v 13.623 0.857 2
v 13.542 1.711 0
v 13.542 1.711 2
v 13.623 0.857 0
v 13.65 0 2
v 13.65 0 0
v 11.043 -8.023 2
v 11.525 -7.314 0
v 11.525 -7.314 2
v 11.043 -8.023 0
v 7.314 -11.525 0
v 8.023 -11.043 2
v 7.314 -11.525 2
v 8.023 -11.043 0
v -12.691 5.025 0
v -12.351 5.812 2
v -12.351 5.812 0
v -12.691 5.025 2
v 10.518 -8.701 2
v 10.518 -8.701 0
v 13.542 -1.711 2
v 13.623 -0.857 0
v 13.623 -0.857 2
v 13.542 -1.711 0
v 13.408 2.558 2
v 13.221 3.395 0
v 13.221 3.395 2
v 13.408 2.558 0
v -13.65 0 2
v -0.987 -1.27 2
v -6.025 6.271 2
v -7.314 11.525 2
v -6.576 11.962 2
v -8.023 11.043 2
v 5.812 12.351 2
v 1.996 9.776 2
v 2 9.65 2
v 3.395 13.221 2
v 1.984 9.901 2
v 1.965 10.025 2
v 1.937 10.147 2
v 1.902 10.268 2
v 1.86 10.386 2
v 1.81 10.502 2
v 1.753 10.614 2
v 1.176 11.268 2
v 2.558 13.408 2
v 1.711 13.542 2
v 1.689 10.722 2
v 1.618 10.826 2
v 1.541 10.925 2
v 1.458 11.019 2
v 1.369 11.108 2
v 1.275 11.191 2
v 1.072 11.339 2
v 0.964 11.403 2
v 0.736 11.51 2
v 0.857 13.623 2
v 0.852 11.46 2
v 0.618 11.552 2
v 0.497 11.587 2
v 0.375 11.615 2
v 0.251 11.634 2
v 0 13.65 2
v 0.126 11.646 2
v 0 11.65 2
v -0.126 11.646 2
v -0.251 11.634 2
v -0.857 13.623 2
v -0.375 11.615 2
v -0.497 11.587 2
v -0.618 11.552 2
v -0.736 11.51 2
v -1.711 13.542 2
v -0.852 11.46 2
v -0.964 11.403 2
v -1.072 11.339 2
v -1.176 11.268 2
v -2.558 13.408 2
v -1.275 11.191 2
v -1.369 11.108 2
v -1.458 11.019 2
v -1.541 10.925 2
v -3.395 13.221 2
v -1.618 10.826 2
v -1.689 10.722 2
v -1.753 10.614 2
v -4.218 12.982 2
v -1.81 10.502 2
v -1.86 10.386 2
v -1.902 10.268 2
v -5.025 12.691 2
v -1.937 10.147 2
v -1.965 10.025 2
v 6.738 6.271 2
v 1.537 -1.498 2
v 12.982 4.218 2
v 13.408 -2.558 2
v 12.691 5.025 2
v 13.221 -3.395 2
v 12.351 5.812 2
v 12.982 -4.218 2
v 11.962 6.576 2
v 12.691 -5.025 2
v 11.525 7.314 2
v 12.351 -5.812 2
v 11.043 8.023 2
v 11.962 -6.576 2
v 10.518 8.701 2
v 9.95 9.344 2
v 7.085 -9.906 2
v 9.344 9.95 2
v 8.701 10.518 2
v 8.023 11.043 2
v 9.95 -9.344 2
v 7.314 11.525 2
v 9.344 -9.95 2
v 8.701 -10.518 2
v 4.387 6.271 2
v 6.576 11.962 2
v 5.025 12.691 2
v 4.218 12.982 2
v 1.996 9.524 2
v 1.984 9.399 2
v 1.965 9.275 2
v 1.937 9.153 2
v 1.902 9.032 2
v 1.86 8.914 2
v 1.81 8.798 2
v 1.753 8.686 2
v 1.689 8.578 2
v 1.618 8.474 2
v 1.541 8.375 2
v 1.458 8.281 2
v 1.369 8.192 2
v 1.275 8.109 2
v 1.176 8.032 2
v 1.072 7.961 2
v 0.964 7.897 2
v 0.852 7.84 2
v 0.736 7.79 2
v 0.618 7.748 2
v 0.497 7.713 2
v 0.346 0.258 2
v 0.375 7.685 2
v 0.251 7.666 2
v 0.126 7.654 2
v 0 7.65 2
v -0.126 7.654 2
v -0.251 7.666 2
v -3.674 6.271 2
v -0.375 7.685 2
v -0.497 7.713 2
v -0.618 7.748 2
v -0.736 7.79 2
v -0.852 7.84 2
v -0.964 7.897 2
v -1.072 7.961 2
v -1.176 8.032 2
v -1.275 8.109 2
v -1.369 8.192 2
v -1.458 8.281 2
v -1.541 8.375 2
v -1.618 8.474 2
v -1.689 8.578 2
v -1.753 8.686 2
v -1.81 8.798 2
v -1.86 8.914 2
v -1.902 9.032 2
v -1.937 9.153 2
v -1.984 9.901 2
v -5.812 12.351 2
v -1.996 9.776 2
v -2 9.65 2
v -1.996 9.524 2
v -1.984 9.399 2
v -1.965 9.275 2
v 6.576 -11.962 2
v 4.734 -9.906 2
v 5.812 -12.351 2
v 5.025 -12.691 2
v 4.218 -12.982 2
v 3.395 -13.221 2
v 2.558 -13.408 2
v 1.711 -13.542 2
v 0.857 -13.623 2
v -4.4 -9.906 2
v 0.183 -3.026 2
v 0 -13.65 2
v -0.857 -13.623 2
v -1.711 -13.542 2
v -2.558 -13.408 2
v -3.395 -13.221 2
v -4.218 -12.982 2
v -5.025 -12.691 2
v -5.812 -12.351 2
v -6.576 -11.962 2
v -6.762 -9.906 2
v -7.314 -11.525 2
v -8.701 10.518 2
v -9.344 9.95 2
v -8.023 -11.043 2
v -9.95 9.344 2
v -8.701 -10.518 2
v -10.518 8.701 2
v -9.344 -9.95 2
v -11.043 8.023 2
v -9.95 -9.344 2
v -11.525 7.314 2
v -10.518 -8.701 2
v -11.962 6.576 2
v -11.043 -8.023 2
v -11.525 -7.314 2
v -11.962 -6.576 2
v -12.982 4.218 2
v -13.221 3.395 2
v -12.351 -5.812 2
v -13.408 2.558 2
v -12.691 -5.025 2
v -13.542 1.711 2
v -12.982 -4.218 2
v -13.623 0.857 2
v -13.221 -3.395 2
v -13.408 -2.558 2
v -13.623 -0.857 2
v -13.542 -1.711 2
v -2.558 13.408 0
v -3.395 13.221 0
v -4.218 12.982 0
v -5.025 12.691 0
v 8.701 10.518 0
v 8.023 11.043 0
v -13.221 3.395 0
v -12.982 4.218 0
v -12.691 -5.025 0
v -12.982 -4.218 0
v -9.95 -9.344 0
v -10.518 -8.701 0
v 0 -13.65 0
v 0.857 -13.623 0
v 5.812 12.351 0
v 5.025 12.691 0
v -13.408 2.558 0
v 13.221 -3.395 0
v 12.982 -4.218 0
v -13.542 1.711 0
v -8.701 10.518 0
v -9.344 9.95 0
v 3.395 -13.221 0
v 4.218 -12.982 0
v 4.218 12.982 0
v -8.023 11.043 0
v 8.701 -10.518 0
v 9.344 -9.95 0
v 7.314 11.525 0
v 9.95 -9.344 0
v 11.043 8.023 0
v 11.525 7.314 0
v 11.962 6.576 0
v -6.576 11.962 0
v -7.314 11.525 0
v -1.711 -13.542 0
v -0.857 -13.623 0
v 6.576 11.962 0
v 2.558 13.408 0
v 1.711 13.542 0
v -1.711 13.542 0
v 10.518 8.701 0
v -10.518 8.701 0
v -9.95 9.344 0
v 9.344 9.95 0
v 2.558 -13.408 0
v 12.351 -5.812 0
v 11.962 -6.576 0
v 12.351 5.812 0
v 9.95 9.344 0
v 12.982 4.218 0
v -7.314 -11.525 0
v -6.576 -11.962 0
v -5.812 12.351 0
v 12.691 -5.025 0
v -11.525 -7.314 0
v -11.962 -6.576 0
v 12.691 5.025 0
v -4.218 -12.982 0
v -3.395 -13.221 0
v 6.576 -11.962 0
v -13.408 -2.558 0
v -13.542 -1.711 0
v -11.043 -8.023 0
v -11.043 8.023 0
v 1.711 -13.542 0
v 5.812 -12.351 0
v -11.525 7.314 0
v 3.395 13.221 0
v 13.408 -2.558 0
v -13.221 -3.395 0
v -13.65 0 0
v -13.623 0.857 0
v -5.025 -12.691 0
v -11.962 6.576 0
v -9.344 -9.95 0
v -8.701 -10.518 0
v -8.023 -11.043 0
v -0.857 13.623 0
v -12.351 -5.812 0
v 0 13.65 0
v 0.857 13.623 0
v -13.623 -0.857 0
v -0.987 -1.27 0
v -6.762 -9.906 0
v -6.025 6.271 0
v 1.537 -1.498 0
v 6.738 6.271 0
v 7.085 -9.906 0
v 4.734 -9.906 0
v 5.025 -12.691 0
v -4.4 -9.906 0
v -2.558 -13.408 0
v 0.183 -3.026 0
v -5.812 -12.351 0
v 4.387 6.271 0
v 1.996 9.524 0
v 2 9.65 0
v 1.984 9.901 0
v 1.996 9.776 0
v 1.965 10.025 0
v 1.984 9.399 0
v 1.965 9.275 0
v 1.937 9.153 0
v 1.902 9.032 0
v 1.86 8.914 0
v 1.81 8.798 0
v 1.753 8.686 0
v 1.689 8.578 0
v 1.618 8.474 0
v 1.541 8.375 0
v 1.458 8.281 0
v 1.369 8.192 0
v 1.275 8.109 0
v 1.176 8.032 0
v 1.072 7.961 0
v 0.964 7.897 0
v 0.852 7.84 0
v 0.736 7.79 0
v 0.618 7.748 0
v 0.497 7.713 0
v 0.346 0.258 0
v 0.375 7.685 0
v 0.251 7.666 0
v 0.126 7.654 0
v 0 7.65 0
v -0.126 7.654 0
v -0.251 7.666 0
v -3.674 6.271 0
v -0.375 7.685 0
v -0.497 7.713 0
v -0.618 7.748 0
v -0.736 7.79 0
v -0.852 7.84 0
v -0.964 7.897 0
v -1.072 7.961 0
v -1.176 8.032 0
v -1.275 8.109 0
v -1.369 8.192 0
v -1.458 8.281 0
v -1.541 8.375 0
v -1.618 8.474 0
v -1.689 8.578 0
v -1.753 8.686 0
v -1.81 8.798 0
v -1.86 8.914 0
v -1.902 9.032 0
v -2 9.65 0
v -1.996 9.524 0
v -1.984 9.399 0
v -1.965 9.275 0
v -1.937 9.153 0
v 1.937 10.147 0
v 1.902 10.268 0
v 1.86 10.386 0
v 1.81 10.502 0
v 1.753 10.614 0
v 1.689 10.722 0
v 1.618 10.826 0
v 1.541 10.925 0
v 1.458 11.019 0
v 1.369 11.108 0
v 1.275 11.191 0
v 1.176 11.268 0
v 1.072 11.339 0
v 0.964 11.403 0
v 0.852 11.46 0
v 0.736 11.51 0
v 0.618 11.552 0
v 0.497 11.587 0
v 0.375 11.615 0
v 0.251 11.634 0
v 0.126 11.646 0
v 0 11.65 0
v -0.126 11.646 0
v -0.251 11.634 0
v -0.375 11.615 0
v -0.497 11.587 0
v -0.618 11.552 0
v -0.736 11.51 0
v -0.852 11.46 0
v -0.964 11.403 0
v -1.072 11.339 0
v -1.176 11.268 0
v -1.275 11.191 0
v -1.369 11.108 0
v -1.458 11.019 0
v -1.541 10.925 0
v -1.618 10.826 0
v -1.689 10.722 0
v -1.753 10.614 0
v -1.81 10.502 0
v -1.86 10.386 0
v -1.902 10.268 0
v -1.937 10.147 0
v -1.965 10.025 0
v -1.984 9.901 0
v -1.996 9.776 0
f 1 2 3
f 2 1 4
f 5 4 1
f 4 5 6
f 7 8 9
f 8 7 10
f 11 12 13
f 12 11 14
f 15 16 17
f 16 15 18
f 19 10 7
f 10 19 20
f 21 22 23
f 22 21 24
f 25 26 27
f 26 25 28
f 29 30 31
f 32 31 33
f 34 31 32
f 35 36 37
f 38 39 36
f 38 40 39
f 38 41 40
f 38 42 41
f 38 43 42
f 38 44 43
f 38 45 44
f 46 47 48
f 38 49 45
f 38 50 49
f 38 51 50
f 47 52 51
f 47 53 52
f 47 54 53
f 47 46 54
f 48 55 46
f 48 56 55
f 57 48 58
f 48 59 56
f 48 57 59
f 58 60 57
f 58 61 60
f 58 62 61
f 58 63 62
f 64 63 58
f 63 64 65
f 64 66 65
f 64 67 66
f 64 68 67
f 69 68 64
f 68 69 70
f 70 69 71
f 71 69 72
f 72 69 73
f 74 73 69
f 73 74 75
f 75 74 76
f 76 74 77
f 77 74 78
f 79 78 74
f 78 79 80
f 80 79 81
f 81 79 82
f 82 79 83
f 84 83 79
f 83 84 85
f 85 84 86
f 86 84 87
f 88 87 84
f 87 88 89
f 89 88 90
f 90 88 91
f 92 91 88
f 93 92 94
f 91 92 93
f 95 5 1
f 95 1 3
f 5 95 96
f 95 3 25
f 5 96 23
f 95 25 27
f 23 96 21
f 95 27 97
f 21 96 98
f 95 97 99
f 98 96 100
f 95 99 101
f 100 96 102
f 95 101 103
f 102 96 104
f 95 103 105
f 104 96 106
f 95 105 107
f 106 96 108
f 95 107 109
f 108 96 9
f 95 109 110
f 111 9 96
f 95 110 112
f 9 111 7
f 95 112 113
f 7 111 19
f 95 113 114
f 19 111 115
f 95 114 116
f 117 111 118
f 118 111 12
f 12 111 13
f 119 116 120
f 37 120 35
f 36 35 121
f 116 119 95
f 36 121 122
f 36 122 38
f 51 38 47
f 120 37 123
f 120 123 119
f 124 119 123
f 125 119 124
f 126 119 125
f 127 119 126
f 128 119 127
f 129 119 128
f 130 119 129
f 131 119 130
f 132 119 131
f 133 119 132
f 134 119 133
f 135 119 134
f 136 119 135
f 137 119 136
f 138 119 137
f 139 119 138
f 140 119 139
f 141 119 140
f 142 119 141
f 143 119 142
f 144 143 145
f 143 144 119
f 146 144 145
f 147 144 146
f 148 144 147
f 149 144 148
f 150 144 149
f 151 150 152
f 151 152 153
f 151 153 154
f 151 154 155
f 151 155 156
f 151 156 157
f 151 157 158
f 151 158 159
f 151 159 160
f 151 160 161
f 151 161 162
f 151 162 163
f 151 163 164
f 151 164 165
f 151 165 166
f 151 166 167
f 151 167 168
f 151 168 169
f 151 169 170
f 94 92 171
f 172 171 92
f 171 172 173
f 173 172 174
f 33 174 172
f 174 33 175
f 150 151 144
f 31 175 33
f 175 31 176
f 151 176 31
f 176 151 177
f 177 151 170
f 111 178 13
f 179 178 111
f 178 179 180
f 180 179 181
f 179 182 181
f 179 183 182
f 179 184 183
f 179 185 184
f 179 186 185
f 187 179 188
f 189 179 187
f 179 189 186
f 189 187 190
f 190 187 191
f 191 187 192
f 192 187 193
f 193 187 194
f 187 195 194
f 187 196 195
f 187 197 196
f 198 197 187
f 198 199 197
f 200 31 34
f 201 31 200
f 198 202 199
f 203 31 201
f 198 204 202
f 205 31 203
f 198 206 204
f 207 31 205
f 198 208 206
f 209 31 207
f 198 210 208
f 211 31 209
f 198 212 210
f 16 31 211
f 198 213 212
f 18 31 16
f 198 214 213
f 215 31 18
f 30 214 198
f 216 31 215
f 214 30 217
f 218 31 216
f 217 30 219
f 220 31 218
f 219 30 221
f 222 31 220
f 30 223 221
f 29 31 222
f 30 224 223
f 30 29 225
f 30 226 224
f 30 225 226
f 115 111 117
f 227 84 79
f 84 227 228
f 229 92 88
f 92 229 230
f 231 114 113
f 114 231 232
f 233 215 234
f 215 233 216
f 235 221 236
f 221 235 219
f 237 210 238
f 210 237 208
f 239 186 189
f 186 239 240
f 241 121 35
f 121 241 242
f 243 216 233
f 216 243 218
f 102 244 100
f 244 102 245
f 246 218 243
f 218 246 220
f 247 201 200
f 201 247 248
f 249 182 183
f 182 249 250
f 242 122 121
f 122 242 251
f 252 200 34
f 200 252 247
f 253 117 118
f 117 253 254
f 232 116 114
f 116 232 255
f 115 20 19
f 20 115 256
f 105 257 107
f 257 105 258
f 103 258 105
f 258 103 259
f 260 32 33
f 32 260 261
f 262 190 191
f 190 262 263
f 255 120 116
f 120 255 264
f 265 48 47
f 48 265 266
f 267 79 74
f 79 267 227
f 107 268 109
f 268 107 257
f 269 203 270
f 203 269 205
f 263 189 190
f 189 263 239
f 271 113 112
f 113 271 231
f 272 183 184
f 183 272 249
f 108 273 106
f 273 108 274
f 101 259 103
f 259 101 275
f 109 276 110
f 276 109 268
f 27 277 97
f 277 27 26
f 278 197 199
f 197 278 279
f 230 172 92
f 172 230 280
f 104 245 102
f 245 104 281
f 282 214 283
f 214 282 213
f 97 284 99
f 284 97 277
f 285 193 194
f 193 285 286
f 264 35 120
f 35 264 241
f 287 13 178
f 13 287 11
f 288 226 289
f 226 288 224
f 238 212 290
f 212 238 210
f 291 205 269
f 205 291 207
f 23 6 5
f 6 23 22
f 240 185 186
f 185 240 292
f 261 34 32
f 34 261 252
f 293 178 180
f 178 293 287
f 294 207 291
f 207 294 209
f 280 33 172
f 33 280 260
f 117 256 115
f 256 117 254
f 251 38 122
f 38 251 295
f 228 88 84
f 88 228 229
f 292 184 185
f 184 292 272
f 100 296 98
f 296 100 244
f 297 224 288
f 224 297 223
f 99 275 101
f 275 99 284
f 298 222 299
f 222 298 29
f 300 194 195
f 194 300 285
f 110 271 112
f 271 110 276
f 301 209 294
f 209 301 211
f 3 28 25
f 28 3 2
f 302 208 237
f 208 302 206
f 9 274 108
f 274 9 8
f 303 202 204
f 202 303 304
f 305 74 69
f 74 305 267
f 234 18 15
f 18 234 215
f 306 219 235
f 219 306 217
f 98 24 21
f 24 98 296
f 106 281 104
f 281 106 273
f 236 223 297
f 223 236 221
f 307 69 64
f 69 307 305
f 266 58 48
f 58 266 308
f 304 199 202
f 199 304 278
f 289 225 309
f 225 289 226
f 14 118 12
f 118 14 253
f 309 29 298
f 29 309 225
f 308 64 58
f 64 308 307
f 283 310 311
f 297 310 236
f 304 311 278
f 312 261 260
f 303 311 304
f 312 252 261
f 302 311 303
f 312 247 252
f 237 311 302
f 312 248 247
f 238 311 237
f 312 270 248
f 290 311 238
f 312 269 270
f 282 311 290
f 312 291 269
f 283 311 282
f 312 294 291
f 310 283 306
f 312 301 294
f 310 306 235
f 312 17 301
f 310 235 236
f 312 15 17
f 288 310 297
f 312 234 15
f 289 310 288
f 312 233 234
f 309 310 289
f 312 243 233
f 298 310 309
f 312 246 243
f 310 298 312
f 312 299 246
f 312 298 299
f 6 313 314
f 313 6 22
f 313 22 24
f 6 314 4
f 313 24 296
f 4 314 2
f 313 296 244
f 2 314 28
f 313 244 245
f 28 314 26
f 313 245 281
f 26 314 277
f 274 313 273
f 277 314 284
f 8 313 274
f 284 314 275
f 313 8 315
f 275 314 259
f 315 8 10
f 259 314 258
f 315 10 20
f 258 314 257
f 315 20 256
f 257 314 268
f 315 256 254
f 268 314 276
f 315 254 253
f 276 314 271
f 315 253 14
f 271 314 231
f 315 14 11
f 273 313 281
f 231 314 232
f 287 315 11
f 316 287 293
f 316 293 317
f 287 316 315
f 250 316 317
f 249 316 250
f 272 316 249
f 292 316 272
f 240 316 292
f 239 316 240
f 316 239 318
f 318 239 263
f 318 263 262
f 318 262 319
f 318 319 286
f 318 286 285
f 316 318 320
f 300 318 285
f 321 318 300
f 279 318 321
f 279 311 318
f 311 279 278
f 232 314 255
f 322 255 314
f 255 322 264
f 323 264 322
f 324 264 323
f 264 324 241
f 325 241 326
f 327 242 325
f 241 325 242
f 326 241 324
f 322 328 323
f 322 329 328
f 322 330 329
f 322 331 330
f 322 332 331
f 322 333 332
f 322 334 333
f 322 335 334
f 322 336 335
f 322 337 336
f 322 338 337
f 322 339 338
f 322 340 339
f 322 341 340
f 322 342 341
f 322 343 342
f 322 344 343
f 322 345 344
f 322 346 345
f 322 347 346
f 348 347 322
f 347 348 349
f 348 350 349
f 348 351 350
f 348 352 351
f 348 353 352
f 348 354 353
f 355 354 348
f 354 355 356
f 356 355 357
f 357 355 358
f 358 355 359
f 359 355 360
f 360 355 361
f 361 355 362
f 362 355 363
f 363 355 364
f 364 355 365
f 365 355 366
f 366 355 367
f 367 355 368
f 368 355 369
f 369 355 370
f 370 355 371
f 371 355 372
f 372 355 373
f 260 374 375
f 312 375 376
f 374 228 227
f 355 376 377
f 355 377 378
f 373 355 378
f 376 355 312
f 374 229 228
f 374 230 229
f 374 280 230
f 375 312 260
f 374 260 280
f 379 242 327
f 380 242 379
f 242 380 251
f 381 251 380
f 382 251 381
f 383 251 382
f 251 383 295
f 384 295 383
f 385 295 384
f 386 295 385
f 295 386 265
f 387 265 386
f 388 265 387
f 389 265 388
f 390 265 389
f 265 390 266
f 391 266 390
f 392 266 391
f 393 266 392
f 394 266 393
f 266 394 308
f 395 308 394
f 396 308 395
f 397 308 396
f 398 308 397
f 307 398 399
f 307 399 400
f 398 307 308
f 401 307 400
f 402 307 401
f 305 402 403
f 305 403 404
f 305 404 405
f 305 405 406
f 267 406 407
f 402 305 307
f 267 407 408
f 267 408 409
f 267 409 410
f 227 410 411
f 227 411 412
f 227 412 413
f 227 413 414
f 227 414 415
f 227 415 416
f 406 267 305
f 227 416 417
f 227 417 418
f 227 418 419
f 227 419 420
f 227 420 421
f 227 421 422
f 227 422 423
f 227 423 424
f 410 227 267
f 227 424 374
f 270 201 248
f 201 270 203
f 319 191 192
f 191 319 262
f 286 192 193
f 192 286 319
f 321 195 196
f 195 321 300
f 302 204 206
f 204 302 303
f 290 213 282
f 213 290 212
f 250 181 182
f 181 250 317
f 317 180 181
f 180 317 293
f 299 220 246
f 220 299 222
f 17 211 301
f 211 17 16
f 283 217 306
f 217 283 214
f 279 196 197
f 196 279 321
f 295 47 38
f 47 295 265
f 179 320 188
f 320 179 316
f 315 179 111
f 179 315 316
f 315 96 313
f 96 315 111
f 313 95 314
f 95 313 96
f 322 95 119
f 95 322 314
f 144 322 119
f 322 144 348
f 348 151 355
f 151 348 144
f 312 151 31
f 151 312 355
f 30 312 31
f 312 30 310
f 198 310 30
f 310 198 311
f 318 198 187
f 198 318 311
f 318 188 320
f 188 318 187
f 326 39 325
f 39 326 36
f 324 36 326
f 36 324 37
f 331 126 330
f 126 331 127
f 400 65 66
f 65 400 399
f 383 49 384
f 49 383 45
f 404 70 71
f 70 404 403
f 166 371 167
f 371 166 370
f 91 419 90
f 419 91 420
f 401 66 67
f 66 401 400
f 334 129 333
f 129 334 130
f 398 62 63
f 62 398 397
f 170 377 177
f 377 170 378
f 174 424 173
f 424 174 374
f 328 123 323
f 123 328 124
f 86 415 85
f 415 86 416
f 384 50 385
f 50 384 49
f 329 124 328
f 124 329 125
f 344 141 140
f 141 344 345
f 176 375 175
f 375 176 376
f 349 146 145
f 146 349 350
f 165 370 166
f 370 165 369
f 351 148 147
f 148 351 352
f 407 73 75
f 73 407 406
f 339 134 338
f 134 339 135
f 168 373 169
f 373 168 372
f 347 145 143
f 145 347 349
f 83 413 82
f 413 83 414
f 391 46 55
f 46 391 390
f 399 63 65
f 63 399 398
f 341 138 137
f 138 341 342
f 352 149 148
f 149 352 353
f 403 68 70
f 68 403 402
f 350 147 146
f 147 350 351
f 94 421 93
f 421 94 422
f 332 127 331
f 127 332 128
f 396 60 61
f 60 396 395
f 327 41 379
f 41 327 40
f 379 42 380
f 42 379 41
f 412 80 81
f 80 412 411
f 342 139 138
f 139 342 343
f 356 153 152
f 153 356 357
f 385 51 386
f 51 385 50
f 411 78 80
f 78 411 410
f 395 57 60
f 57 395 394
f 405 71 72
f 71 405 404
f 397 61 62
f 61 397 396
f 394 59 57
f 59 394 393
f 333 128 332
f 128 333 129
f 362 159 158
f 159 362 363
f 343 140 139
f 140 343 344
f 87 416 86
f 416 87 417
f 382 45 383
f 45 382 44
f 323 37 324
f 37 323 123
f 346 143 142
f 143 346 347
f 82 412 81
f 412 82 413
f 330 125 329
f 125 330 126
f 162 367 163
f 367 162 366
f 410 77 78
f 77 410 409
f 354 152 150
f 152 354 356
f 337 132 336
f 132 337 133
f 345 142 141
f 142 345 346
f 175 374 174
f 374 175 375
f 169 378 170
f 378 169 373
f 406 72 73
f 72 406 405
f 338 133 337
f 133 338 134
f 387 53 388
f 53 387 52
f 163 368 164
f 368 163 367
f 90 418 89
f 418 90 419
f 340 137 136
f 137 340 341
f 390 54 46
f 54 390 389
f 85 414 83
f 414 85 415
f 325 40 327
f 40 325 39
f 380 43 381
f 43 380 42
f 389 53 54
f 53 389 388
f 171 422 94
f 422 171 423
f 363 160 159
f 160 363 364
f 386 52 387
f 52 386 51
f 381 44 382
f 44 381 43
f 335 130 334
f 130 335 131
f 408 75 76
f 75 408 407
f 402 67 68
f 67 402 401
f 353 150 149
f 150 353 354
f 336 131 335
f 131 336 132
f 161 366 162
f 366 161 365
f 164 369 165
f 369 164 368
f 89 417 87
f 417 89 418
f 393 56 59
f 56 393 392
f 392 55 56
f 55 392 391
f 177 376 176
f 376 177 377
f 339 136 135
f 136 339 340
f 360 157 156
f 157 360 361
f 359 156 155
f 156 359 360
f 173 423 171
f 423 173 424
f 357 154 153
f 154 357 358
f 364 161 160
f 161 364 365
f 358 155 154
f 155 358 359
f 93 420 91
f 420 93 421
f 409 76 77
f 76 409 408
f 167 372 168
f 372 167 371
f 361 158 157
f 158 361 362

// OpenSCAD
token_diameter=27.3;
token_height=2;
token_radius=token_diameter/2;
hole_diameter=4;
hole_border_distance=2;
hole_radius=hole_diameter/2;
decal_enabled=true;
decal_text="X";
z_rotation=0;
font="Stencilia\\-A:style=Regular";
manual_font_size_enabled=false;
manual_font_size=10;
font_size=manual_font_size_enabled ? manual_font_size : -0.0025*pow(token_diameter,2)+0.975*token_diameter-8.777;
manual_y_offset_enabled=false;
manual_y_offset=-2.8;
y_offset=manual_y_offset_enabled ? manual_y_offset : 0.00077*pow(token_diameter,2)+0.027*token_diameter-3.318;
x_offset=0;

difference() {
    cylinder(token_height, token_radius, token_radius, $fn=100);
    if(decal_enabled) {
        #rotate([0,0,z_rotation]) {
            translate([x_offset,y_offset,-1]) {
                linear_extrude(height=token_height+2) {
                    text(decal_text,font=font,size=font_size,halign="center",valign="center",script="utf-8");
                }
            }
        }
    }
    #translate([0,token_radius-hole_radius-hole_border_distance,-1]) {
        cylinder(token_height+2, hole_radius, hole_radius, $fn=100);
    }
}
